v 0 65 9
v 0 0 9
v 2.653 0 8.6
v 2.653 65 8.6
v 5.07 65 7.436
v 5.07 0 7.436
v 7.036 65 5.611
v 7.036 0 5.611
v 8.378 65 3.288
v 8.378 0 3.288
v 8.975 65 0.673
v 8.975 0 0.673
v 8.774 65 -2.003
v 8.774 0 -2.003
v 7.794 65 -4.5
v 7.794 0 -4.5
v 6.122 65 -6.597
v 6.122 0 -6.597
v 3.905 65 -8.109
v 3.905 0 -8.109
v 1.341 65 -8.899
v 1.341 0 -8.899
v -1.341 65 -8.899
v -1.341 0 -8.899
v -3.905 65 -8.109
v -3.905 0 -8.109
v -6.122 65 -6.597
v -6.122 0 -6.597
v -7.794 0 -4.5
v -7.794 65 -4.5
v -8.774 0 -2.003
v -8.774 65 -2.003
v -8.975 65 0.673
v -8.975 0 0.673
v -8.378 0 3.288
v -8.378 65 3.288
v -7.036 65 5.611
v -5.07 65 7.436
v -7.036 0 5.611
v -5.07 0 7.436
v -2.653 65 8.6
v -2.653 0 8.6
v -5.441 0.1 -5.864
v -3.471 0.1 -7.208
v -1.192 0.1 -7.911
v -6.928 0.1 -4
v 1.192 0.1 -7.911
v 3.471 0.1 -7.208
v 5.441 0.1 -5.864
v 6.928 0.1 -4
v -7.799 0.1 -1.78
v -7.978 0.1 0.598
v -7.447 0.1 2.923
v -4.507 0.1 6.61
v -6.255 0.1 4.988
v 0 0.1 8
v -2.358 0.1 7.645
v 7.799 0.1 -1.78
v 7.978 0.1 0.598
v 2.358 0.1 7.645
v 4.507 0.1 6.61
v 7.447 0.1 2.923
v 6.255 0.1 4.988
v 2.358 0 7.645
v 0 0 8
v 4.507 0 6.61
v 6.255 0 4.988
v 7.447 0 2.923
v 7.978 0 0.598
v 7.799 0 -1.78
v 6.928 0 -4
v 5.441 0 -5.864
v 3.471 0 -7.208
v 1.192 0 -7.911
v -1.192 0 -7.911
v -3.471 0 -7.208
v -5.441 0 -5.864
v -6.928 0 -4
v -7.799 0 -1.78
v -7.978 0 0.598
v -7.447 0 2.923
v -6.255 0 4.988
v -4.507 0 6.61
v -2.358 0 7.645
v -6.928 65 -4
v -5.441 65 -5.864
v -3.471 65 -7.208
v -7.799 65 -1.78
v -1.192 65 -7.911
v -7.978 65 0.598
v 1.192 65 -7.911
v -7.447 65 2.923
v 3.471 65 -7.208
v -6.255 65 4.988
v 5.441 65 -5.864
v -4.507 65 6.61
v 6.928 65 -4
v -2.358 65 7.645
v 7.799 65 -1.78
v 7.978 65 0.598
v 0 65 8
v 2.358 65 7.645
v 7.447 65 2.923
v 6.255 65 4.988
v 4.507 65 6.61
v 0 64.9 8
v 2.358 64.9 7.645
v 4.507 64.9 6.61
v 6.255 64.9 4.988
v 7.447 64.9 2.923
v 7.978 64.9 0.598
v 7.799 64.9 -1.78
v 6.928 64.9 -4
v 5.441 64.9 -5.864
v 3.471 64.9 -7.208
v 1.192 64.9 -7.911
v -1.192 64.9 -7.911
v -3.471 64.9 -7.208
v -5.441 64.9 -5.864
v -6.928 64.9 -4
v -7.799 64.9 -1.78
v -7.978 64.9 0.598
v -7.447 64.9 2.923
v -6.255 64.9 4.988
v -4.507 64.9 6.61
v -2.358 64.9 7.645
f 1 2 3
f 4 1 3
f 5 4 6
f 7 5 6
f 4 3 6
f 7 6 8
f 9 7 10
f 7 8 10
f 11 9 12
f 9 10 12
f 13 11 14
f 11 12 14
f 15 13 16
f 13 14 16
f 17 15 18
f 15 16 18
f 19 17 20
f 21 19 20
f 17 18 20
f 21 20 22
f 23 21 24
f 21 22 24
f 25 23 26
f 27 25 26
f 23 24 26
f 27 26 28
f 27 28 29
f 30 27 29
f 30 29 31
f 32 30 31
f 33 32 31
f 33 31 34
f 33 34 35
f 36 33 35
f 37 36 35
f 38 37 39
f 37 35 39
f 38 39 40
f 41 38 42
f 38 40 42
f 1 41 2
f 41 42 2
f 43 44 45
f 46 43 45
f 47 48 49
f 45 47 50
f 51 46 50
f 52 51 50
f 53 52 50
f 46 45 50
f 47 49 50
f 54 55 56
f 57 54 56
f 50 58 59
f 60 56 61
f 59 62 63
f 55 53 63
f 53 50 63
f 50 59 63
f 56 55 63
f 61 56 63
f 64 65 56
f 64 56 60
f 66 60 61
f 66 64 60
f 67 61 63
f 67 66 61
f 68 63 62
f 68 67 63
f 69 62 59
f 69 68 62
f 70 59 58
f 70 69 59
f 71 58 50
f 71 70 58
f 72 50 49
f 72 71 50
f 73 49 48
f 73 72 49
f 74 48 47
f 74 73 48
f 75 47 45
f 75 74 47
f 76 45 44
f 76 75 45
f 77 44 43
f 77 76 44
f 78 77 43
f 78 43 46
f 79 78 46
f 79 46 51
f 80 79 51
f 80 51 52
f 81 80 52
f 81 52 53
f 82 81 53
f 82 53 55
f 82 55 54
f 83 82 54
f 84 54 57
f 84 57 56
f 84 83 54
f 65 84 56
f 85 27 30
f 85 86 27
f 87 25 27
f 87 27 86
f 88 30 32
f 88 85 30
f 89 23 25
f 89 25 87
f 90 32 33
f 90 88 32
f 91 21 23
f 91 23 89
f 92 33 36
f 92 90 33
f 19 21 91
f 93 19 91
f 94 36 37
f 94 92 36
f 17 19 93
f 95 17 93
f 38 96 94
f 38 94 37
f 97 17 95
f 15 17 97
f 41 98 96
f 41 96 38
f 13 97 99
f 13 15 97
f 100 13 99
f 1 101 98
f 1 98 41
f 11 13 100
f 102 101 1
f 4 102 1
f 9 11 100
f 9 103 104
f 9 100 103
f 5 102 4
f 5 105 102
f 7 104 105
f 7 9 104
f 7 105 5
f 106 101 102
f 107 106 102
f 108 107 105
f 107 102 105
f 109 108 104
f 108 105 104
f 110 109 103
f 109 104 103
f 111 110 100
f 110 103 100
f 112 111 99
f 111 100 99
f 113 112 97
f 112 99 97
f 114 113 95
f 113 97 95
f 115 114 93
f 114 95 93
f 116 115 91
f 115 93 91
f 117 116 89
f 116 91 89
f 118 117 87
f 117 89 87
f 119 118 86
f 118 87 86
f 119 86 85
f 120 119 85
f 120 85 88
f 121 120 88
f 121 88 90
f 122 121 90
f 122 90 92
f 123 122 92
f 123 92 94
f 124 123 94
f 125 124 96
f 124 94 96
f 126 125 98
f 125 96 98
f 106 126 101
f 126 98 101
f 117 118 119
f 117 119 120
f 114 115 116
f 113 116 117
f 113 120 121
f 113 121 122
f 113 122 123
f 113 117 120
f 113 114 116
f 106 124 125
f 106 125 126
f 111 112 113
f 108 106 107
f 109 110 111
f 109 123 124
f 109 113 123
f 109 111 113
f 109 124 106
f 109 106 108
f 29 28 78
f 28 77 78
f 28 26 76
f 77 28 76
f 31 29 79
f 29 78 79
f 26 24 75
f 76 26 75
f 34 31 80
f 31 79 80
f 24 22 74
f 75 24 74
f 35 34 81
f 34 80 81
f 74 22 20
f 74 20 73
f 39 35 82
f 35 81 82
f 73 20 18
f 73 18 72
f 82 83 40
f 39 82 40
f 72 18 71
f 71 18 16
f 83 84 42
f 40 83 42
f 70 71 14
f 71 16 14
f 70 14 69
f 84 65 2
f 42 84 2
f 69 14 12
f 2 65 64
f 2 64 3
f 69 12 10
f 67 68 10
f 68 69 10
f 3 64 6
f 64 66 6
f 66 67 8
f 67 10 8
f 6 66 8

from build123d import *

# Parameters (mm, degrees)
SKETCH1_R           = 9
BOSS_EXTRUDE1_DEPTH = 65
SKETCH2_R           = 8
CUT_EXTRUDE1_DEPTH  = 0.1


with BuildPart() as part:
    # Sketch1 → Boss-Extrude1 (new body)
    with BuildSketch(Plane(origin=(0, 0, 0), x_dir=(1, 0, 0), z_dir=(0, 1, 0))):
        with Locations(Location((0, 0, 0), (0, 0, 270))):
            Circle(SKETCH1_R)
    extrude(amount=BOSS_EXTRUDE1_DEPTH)

    # Sketch2 → Cut-Extrude1 (cut)
    with BuildSketch(Plane(origin=(0, 65, 0), x_dir=(1, 0, 0), z_dir=(0, 1, 0))):
        with Locations(Location((0, 0, 0), (0, 0, 270))):
            Circle(SKETCH2_R)
    cut_extrude1 = extrude(amount=-CUT_EXTRUDE1_DEPTH, mode=Mode.SUBTRACT)

    # Mirror1: Cut-Extrude1 across plane
    add(cut_extrude1.mirror(Plane.ZX.offset(32.5)), mode=Mode.SUBTRACT)


solid = part.part
